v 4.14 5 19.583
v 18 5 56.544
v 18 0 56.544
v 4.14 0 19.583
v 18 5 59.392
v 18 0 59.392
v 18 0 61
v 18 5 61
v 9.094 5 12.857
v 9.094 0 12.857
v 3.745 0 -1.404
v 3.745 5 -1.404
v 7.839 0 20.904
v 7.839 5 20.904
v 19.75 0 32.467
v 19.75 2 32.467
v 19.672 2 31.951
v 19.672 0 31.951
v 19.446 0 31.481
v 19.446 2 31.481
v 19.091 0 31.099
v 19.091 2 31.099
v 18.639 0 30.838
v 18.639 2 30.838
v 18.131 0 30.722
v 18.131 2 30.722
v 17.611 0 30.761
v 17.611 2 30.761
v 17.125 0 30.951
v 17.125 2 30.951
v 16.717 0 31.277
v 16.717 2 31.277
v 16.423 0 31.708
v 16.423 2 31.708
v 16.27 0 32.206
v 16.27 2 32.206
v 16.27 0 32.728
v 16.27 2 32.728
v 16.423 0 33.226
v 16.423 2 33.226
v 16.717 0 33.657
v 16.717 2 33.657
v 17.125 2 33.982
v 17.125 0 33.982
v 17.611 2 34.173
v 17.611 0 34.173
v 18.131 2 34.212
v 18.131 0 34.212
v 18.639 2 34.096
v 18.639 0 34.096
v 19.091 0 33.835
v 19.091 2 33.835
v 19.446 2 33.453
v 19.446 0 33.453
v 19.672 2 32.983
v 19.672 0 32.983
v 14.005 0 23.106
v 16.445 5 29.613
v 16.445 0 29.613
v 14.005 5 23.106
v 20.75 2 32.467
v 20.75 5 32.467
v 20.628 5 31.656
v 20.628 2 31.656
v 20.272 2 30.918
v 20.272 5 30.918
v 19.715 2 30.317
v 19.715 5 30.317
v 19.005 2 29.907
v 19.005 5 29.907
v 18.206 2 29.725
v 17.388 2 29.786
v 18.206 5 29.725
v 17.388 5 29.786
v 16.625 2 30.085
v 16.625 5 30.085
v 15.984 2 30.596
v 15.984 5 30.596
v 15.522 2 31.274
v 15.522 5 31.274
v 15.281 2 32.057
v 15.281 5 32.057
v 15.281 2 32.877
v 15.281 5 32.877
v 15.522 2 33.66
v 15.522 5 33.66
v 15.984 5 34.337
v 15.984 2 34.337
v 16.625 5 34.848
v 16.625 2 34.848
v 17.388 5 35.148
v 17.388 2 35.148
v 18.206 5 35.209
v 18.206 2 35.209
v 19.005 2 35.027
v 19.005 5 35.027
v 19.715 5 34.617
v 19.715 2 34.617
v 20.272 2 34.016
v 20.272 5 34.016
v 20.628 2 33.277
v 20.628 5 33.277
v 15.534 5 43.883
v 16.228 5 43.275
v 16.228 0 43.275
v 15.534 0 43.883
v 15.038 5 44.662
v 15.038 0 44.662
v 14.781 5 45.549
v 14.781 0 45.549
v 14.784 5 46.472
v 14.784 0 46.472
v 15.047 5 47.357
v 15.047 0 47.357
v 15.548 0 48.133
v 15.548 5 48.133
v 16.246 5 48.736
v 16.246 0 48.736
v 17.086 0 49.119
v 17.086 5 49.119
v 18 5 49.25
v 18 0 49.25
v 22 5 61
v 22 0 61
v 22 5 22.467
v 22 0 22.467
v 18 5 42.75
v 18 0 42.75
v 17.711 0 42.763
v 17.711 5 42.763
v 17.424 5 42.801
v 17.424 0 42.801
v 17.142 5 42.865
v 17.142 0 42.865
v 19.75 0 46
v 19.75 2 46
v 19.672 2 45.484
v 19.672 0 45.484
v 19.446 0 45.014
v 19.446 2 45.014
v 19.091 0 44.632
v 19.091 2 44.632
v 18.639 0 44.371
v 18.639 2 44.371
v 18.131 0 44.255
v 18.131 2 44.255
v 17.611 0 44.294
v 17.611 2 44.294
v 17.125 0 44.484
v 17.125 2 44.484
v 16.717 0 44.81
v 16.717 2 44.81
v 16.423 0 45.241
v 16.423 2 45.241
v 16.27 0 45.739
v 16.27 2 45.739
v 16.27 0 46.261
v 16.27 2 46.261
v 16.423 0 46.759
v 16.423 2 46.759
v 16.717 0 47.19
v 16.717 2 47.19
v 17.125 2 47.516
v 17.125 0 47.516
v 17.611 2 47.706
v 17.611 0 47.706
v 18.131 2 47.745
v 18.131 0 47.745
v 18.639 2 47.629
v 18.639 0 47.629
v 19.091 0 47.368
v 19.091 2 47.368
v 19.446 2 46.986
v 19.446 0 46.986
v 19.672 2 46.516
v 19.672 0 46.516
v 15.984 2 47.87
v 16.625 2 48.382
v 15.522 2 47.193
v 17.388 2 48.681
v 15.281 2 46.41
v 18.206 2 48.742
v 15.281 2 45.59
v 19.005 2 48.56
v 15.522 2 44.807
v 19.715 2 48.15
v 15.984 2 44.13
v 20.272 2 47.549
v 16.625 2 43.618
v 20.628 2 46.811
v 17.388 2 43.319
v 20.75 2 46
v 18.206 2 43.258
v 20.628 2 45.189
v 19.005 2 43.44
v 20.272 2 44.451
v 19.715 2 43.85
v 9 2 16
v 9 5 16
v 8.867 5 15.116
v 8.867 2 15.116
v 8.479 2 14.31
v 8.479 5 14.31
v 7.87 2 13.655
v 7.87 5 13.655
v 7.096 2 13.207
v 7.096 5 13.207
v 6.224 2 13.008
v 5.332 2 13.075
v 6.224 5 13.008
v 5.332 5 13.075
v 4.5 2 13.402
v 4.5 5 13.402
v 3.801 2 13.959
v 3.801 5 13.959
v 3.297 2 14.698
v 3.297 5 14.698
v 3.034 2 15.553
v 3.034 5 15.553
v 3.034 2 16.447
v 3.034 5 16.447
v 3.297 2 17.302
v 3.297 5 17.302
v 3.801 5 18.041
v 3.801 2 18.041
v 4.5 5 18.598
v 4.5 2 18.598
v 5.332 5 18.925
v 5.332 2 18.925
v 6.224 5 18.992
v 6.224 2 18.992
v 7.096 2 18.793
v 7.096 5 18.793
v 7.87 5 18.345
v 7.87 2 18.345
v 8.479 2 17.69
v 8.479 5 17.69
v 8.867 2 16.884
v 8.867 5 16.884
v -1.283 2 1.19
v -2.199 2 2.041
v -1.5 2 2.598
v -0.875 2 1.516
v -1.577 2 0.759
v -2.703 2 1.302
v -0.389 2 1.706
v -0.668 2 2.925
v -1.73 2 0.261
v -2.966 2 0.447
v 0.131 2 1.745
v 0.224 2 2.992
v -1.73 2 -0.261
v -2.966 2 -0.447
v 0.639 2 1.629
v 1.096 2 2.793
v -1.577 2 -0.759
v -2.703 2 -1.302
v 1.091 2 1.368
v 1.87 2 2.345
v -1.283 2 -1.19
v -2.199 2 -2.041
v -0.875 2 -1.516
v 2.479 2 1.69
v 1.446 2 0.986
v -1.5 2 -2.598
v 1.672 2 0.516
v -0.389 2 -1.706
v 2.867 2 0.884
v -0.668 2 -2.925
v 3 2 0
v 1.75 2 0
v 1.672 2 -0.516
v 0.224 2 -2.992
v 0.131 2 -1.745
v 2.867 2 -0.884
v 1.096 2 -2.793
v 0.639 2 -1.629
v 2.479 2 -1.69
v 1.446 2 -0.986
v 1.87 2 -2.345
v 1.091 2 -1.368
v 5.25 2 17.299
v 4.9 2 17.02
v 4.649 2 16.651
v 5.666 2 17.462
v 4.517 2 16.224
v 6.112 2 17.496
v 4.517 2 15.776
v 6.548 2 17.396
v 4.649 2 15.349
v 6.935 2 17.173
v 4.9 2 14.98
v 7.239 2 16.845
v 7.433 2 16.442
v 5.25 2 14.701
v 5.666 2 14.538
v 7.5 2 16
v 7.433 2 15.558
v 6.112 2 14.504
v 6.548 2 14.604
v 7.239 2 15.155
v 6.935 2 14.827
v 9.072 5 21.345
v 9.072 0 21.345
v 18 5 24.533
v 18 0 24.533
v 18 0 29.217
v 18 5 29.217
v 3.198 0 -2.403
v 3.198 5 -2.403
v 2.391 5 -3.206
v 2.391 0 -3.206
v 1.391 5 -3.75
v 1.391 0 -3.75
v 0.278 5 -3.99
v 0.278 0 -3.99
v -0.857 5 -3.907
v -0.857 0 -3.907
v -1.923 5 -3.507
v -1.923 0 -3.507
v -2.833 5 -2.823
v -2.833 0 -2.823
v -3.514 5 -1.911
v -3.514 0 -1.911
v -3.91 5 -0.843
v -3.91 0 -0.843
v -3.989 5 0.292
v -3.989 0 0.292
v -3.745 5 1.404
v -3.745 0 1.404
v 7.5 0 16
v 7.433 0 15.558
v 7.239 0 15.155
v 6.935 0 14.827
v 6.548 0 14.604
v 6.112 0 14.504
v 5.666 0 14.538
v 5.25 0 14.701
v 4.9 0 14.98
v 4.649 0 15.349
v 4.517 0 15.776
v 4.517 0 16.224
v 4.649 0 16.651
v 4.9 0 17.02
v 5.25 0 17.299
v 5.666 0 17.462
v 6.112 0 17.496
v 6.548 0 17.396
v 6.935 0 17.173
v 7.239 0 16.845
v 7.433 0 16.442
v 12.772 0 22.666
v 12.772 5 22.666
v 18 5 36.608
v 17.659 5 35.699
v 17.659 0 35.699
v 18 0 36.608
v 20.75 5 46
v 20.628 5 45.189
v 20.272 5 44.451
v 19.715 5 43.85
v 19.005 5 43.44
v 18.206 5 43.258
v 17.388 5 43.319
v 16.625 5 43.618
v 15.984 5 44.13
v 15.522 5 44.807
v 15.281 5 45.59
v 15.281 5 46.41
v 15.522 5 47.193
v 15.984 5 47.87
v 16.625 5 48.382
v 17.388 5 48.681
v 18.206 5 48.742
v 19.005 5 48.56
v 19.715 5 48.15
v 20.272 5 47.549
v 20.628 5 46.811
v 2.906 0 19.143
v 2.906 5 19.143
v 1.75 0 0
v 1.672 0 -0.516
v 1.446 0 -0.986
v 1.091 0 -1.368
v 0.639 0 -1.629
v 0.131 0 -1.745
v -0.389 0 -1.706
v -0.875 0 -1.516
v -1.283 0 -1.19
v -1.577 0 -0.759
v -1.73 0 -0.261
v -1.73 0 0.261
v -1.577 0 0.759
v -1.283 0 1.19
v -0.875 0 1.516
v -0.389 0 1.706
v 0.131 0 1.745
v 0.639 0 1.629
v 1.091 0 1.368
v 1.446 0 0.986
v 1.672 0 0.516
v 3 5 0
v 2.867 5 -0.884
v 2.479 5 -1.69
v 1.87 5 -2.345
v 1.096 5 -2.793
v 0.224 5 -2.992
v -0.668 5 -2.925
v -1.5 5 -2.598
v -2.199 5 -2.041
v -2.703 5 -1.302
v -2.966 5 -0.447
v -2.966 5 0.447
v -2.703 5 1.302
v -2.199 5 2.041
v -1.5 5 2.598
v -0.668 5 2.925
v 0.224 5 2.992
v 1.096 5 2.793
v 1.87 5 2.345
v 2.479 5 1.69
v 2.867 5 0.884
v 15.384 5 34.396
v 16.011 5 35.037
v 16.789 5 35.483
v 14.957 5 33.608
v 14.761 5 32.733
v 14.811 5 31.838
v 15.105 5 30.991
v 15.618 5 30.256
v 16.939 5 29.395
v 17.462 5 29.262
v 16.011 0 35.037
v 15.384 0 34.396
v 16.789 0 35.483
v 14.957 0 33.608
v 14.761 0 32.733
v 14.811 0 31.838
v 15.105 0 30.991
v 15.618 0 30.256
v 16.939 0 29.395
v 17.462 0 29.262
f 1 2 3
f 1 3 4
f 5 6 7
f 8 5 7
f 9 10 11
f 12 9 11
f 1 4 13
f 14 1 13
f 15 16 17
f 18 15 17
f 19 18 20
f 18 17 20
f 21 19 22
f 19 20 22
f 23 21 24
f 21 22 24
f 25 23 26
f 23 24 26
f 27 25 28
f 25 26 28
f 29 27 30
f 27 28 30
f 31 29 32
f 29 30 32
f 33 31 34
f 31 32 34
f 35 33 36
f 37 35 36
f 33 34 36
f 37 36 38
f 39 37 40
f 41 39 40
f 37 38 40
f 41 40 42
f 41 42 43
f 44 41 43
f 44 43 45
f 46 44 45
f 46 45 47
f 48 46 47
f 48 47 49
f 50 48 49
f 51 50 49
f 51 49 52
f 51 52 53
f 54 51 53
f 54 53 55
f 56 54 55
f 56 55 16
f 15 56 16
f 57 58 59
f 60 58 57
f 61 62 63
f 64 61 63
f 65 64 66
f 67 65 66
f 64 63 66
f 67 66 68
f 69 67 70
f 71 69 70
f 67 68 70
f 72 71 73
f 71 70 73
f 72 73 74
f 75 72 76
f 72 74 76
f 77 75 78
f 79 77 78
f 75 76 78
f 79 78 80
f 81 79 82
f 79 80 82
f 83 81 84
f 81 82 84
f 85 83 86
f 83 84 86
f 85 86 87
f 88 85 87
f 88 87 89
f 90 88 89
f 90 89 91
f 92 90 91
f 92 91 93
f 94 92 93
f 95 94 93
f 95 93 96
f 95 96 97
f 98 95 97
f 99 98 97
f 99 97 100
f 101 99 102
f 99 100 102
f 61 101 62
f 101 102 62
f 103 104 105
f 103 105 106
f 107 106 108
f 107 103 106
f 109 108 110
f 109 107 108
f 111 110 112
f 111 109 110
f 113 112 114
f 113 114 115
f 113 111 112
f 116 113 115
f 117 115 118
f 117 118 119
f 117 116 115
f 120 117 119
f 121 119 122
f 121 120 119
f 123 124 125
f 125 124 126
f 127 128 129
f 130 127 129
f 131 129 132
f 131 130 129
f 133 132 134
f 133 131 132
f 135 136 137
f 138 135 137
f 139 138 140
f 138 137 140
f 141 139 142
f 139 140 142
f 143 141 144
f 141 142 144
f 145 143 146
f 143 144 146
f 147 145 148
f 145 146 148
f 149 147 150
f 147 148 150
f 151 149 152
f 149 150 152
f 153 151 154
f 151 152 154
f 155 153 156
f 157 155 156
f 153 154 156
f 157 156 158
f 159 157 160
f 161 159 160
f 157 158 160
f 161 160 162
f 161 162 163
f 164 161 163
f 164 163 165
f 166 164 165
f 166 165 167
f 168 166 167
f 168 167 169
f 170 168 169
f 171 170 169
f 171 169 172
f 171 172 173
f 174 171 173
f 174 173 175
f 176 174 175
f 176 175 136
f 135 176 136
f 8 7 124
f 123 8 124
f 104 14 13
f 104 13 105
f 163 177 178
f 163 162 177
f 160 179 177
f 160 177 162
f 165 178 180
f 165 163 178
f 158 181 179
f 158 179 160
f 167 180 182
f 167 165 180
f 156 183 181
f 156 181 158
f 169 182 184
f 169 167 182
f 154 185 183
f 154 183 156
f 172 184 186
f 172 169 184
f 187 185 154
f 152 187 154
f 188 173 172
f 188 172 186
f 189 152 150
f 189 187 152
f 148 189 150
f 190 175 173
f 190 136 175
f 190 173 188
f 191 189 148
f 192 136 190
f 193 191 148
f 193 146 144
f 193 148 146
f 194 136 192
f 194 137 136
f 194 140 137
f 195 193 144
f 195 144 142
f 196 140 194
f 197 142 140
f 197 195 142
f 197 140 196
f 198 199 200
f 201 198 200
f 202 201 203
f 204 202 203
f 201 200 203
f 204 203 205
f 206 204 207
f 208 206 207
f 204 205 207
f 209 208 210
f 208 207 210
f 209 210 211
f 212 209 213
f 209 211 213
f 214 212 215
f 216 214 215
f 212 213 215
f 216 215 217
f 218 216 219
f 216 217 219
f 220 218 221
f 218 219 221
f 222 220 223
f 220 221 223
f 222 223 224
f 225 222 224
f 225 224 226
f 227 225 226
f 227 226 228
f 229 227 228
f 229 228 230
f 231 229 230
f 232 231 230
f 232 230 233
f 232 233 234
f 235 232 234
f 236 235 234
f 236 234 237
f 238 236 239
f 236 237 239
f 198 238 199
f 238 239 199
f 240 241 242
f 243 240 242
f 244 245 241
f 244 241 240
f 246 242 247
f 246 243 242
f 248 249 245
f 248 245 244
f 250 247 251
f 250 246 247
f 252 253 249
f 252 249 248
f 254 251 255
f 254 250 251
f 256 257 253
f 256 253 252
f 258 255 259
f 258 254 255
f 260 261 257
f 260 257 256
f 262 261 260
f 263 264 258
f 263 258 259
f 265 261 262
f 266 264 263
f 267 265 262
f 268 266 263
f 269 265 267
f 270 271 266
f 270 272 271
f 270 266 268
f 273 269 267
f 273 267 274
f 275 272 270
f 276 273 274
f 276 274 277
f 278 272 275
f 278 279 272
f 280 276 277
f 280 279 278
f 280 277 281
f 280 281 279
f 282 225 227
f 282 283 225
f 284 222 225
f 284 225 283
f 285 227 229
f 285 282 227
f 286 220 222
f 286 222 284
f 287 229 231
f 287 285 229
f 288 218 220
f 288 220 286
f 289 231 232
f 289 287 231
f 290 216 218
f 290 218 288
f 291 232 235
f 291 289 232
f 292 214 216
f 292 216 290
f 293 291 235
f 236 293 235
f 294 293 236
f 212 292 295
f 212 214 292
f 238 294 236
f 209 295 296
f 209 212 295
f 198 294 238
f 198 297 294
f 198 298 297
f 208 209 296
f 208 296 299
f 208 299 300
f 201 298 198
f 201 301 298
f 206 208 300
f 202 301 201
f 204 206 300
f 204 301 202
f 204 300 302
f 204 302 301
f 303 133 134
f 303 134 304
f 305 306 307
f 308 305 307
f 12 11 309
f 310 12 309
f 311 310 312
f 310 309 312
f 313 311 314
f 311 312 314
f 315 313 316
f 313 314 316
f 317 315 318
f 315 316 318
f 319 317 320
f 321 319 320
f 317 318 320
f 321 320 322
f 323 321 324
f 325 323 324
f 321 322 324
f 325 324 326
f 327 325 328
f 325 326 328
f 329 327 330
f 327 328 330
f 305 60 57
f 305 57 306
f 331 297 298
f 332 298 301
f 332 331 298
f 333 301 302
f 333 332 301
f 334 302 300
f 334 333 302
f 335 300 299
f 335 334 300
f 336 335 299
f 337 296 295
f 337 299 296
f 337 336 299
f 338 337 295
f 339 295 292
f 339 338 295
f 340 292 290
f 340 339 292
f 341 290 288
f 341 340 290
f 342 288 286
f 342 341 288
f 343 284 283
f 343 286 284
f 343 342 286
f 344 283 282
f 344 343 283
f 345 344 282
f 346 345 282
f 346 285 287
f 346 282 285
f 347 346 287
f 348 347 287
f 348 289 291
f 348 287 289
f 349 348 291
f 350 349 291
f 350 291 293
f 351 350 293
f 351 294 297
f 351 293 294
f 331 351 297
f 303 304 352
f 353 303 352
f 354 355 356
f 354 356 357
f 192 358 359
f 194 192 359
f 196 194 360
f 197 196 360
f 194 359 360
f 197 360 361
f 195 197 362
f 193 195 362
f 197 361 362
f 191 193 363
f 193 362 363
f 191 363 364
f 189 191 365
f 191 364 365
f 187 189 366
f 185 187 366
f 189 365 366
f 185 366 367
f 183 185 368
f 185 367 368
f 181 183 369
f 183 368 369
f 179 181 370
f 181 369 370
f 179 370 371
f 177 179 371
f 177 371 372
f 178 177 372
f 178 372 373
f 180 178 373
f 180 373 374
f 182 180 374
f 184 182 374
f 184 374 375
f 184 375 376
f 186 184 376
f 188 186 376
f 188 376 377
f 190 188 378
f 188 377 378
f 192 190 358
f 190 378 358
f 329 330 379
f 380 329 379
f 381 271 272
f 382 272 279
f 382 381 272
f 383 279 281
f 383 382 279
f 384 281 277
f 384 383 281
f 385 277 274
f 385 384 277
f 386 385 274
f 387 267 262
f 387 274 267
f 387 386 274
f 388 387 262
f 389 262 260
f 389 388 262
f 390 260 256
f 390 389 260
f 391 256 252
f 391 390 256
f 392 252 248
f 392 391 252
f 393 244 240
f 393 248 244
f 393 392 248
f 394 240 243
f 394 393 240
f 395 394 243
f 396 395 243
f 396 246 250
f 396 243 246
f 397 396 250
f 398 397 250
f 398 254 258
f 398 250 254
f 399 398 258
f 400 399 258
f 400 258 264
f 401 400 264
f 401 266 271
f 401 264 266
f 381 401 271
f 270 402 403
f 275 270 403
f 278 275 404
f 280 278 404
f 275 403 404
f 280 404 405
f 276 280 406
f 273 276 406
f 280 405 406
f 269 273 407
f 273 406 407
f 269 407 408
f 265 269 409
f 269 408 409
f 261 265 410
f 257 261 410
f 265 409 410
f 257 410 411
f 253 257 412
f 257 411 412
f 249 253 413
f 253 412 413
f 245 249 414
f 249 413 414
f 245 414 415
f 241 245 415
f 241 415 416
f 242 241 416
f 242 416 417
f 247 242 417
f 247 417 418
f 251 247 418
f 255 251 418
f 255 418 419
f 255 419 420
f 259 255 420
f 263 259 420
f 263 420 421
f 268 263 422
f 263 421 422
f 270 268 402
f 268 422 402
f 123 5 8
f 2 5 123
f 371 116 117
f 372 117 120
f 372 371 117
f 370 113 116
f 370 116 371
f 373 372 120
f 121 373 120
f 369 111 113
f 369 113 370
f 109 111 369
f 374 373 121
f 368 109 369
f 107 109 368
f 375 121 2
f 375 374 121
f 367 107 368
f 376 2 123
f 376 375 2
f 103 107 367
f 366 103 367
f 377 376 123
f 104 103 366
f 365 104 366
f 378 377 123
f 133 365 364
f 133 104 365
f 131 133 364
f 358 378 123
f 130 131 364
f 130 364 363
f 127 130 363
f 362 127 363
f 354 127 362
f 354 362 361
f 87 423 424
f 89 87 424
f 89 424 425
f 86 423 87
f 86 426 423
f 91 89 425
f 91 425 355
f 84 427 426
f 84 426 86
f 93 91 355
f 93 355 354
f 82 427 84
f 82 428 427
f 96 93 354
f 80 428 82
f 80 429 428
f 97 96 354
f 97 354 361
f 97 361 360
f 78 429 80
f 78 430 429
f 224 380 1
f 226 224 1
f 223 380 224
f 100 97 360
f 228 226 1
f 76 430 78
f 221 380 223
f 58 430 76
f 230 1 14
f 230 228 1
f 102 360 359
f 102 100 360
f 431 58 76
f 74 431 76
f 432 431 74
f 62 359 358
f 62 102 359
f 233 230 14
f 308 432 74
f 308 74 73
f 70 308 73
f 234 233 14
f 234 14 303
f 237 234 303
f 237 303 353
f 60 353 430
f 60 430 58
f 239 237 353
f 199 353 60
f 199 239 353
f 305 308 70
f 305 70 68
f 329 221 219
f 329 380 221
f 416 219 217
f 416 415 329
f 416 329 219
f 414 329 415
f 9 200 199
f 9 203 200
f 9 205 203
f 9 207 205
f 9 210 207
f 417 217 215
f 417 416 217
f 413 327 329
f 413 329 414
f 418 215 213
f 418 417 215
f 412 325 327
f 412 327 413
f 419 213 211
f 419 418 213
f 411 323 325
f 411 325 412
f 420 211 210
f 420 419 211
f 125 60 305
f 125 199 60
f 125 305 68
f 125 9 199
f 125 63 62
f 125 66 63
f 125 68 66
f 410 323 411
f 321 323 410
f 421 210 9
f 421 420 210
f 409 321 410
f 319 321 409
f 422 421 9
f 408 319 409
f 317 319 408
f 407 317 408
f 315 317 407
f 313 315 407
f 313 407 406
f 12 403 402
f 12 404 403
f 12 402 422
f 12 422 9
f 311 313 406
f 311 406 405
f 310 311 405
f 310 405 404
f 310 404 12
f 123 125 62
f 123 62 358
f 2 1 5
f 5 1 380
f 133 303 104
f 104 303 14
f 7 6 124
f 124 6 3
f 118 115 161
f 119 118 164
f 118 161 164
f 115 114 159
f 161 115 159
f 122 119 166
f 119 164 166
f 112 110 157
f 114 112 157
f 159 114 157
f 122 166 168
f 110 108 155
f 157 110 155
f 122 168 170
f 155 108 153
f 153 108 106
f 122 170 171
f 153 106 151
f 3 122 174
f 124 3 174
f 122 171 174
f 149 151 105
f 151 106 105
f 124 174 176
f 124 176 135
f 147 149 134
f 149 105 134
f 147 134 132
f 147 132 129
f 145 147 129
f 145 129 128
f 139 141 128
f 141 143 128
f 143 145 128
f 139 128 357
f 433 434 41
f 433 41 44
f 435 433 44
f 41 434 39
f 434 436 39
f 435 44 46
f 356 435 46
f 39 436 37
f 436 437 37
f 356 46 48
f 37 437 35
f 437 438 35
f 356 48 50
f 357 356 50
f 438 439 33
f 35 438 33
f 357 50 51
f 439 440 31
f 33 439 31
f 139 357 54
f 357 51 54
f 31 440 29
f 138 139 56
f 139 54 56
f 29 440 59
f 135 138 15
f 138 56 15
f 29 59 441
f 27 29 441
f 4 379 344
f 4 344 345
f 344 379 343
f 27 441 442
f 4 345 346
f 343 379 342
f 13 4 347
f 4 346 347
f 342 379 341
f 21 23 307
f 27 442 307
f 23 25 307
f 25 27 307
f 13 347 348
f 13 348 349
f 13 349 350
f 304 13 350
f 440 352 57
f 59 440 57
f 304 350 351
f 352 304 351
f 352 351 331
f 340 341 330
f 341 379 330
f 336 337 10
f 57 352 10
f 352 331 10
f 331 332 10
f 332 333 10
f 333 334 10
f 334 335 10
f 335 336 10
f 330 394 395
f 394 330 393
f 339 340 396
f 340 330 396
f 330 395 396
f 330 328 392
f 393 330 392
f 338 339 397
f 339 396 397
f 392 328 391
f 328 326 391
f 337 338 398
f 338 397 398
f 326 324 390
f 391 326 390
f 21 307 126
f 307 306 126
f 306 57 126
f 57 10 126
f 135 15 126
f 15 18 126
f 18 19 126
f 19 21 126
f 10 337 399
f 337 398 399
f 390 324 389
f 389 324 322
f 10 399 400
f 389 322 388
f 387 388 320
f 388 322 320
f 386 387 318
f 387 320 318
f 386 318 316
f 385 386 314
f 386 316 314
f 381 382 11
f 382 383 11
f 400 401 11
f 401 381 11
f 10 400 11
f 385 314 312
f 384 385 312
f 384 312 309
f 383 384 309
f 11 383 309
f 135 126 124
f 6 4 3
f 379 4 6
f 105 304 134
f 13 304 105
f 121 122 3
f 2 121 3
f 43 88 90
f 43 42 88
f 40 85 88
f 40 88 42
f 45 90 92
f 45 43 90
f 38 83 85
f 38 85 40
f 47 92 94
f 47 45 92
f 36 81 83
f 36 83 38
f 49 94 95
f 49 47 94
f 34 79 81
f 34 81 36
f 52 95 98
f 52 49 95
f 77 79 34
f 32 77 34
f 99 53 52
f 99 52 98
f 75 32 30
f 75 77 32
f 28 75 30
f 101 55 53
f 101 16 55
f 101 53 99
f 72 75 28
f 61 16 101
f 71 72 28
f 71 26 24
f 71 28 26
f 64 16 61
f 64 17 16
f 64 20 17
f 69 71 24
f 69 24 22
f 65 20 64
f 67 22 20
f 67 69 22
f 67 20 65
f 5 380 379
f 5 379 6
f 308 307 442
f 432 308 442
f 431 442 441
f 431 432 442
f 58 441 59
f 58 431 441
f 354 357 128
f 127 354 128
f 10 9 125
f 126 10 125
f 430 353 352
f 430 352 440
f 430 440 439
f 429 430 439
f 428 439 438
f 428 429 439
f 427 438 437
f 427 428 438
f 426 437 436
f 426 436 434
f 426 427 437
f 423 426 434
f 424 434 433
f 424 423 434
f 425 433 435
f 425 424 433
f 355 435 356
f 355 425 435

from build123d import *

# Parameters (mm, degrees)
SKIZZE1_R                       = 1.75
SKIZZE1_R_2                     = 1.5
AUFSATZ_LINEAR_AUSTRAGEN1_DEPTH = 5
AUFSATZ_LINEAR_AUSTRAGEN2_DEPTH = 5
SKIZZE4_R                       = 3.25
AUFSATZ_LINEAR_AUSTRAGEN3_DEPTH = 5
SKIZZE5_R                       = 1.75
SCHNITT_LINEAR_AUSTRAGEN2_DEPTH = 5
SKIZZE3_R                       = 3
SKIZZE3_R_2                     = 2.75
SCHNITT_LINEAR_AUSTRAGEN1_DEPTH = 3
SCHNITT_LINEAR_AUSTRAGEN3_DEPTH = 5


with BuildPart() as part:
    # Skizze1 → Aufsatz-Linear austragen1 (new body)
    with BuildSketch(Plane(origin=(0, 0, 0), x_dir=(1, 0, 0), z_dir=(0, 1, 0))):
        with BuildLine():
            Line((-3.74531671, -1.404493766), (2.906480569, -19.142619845))
            Line((2.906480569, -19.142619845), (18, -24.533162499))
            Line((18, -24.533162499), (18, -61))
            Line((18, -61), (22, -61))
            Line((22, -61), (22, -17.466837501))
            Line((22, -17.466837501), (9.093519431, -12.857380155))
            Line((9.093519431, -12.857380155), (3.74531671, 1.404493766))
            ThreePointArc((3.74531671, 1.404493766), (-1.404493766, 3.74531671), (-3.74531671, -1.404493766))
        make_face()
        Circle(SKIZZE1_R, mode=Mode.SUBTRACT)
        with Locations((6, -16)):
            Circle(SKIZZE1_R_2, mode=Mode.SUBTRACT)
    extrude(amount=AUFSATZ_LINEAR_AUSTRAGEN1_DEPTH)

    # Skizze2 → Aufsatz-Linear austragen2 (add)
    with BuildSketch(Plane(origin=(0, 5, 0), x_dir=(1, 0, 0), z_dir=(0, 1, 0))):
        Polygon((2.906480569, -19.142619845), (18, -59.392004994), (18, -56.544003745), (4.139635749, -19.58303241), align=None)
        Polygon((7.839101288, -20.904270102), (18, -48), (18, -45.151998752), (9.072256468, -21.344682666), align=None)
        Polygon((12.771722007, -22.665920359), (18, -36.607995006), (18, -33.759993758), (14.004877187, -23.106332923), align=None)
    extrude(amount=-AUFSATZ_LINEAR_AUSTRAGEN2_DEPTH)

    # Skizze4 → Aufsatz-Linear austragen3 (add)
    with BuildSketch(Plane(origin=(0, 5, 0), x_dir=(1, 0, 0), z_dir=(0, 1, 0))):
        with Locations((18, -32.466837501)):
            Circle(SKIZZE4_R)
        with Locations((18, -46)):
            Circle(SKIZZE4_R)
    extrude(amount=-AUFSATZ_LINEAR_AUSTRAGEN3_DEPTH)

    # Skizze5 → Schnitt-Linear austragen2 (cut)
    with BuildSketch(Plane(origin=(0, 5, 0), x_dir=(1, 0, 0), z_dir=(0, 1, 0))):
        with Locations((18, -32.466837501)):
            Circle(SKIZZE5_R)
        with Locations((18, -46)):
            Circle(SKIZZE5_R)
    extrude(amount=-SCHNITT_LINEAR_AUSTRAGEN2_DEPTH, mode=Mode.SUBTRACT)

    # Skizze3 → Schnitt-Linear austragen1 (cut)
    with BuildSketch(Plane(origin=(0, 5, 0), x_dir=(1, 0, 0), z_dir=(0, 1, 0))):
        Circle(SKIZZE3_R)
        with Locations((6, -16)):
            Circle(SKIZZE3_R)
        with Locations((18, -32.466837501)):
            Circle(SKIZZE3_R_2)
        with Locations((18, -46)):
            Circle(SKIZZE3_R_2)
    extrude(amount=-SCHNITT_LINEAR_AUSTRAGEN1_DEPTH, mode=Mode.SUBTRACT)

    # Skizze6 → Schnitt-Linear austragen3 (cut)
    with BuildSketch(Plane(origin=(0, 5, 0), x_dir=(1, 0, 0), z_dir=(0, 1, 0))):
        Polygon((9.093519431, -12.857380155), (22, -22.466837501), (22, -17.466837501), align=None)
    extrude(amount=-SCHNITT_LINEAR_AUSTRAGEN3_DEPTH, mode=Mode.SUBTRACT)


solid = part.part
